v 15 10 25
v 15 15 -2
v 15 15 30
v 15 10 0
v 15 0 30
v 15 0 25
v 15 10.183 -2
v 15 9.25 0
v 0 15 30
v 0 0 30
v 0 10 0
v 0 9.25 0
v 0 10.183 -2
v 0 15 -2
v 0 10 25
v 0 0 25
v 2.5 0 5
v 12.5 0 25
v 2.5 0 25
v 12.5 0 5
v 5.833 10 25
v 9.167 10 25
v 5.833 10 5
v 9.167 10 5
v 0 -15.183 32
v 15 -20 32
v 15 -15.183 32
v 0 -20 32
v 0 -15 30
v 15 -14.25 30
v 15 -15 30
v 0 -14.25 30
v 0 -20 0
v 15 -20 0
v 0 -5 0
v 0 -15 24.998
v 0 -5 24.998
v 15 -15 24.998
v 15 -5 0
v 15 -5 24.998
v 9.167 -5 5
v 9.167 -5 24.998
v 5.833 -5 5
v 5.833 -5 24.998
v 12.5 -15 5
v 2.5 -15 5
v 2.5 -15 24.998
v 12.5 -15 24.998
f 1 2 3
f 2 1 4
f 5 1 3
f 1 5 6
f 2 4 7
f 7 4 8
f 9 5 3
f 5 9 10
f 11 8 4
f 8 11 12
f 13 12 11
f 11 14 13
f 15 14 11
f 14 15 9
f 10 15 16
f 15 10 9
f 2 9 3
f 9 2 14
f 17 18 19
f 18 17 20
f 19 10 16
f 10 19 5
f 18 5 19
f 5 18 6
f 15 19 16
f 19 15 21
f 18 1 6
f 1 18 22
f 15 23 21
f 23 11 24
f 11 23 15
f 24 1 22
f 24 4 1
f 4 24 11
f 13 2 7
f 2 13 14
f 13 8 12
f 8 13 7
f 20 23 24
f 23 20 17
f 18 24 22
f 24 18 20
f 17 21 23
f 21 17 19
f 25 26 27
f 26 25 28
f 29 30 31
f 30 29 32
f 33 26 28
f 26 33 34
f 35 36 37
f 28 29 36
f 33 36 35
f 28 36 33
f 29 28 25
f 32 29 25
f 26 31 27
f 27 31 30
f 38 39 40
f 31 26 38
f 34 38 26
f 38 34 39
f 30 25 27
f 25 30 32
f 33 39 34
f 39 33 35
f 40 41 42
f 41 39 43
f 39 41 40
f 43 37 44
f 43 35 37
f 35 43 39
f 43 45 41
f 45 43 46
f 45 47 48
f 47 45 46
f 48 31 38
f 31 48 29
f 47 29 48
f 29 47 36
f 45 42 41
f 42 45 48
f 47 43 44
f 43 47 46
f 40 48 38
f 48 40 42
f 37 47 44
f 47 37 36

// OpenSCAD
// Creates an interlocking "keyed" attachment point with a triangle shaped key
module tri_key(x, y, z)
{
	linear_extrude( height = z )
	{
		polygon( points = [ [ 0, 0 ], [ x, 0 ], [x/2, y ] ], paths = [ [ 0, 1 , 2] ] );
	}
}

// Creates a block that has one sloped face to allow slipping in one direction but not the other. 90 degrees is unsloped, smaller angles are shallower sides
module one_way_block(x, y, z, angle)
{
	difference()
	{
		cube( size = [ x, y, z ] );
		
		rotate( [ -90, 0, 0 ] )
		linear_extrude( height = y + 0.001)
		polygon( points = [ [ x, 0], [ x, -z ], [ x - z * tan(90 - angle), -z ] ], paths = [ [ 0, 1, 2 ] ] );
	}
}

// Mounting block with a "key" piece, block designed to constrain it from sliding vertically
module male_key_block( x, y, z, key_x, key_y, key_z )
{
	// Parameters  may need to be experimented with, especially if printed on different scales
	y_overlap = y / 3;
	z_overlap = ( z - key_z )/2;
	
	lock_height = 2;
	lock_overlap = 0.75;
	lock_angle = 65;	

	union()
	{
		translate( [ (x - key_x)/2, 0, z_overlap ] )
		tri_key( key_x, key_y + y_overlap, key_z );
		
		difference()
		{
			cube( size = [ x, y, z ] );
			
			cube( size = [ x, key_y, key_z + z_overlap] );
		}
		
		translate( [ x, y, 0 ] )
		rotate( [ 180, 0, -90 ] )
		one_way_block( x - key_x + lock_overlap, y, lock_height, lock_angle);
	}
}

// Mounting block with a cutout for a matching keyed block, designed to constrain it from sliding vertically
module female_key_block( x, y, z, key_x, key_y, key_z )
{
	y_overlap = y / 3;
	z_overlap = ( z - key_z )/2;
	
	lock_height = 2;
	lock_overlap = 0.75;
	lock_angle = 65;	

	difference()
	{
		union()
		{
			cube( size = [ x, y, z ] );

			translate( [ x, 0, z ] )
			rotate( [ 0, 0, 90 ] )
			one_way_block( x - key_x + lock_overlap, y, lock_height, lock_angle);
		}
		
		translate( [ ( x - key_x)/2, y - key_y, z - key_z - z_overlap ] )
		tri_key( key_x, key_y + y_overlap, key_z );
	
		translate( [ 0, y - key_y, z - z_overlap - 0.002] )
		cube( size = [ x, y, z_overlap + 0.002 ] );
	}
}

length = 15;
height = 30;

x = length;
y = length;
z = height;
key_x = length * 2/3;
key_y = length * 2/3;
key_z =  height * 2/3;


male_key_block( x, y, z, key_x, key_y, key_z );

translate( [ 0, -(y+5), 0 ] )
female_key_block( x, y, z, key_x, key_y, key_z );
